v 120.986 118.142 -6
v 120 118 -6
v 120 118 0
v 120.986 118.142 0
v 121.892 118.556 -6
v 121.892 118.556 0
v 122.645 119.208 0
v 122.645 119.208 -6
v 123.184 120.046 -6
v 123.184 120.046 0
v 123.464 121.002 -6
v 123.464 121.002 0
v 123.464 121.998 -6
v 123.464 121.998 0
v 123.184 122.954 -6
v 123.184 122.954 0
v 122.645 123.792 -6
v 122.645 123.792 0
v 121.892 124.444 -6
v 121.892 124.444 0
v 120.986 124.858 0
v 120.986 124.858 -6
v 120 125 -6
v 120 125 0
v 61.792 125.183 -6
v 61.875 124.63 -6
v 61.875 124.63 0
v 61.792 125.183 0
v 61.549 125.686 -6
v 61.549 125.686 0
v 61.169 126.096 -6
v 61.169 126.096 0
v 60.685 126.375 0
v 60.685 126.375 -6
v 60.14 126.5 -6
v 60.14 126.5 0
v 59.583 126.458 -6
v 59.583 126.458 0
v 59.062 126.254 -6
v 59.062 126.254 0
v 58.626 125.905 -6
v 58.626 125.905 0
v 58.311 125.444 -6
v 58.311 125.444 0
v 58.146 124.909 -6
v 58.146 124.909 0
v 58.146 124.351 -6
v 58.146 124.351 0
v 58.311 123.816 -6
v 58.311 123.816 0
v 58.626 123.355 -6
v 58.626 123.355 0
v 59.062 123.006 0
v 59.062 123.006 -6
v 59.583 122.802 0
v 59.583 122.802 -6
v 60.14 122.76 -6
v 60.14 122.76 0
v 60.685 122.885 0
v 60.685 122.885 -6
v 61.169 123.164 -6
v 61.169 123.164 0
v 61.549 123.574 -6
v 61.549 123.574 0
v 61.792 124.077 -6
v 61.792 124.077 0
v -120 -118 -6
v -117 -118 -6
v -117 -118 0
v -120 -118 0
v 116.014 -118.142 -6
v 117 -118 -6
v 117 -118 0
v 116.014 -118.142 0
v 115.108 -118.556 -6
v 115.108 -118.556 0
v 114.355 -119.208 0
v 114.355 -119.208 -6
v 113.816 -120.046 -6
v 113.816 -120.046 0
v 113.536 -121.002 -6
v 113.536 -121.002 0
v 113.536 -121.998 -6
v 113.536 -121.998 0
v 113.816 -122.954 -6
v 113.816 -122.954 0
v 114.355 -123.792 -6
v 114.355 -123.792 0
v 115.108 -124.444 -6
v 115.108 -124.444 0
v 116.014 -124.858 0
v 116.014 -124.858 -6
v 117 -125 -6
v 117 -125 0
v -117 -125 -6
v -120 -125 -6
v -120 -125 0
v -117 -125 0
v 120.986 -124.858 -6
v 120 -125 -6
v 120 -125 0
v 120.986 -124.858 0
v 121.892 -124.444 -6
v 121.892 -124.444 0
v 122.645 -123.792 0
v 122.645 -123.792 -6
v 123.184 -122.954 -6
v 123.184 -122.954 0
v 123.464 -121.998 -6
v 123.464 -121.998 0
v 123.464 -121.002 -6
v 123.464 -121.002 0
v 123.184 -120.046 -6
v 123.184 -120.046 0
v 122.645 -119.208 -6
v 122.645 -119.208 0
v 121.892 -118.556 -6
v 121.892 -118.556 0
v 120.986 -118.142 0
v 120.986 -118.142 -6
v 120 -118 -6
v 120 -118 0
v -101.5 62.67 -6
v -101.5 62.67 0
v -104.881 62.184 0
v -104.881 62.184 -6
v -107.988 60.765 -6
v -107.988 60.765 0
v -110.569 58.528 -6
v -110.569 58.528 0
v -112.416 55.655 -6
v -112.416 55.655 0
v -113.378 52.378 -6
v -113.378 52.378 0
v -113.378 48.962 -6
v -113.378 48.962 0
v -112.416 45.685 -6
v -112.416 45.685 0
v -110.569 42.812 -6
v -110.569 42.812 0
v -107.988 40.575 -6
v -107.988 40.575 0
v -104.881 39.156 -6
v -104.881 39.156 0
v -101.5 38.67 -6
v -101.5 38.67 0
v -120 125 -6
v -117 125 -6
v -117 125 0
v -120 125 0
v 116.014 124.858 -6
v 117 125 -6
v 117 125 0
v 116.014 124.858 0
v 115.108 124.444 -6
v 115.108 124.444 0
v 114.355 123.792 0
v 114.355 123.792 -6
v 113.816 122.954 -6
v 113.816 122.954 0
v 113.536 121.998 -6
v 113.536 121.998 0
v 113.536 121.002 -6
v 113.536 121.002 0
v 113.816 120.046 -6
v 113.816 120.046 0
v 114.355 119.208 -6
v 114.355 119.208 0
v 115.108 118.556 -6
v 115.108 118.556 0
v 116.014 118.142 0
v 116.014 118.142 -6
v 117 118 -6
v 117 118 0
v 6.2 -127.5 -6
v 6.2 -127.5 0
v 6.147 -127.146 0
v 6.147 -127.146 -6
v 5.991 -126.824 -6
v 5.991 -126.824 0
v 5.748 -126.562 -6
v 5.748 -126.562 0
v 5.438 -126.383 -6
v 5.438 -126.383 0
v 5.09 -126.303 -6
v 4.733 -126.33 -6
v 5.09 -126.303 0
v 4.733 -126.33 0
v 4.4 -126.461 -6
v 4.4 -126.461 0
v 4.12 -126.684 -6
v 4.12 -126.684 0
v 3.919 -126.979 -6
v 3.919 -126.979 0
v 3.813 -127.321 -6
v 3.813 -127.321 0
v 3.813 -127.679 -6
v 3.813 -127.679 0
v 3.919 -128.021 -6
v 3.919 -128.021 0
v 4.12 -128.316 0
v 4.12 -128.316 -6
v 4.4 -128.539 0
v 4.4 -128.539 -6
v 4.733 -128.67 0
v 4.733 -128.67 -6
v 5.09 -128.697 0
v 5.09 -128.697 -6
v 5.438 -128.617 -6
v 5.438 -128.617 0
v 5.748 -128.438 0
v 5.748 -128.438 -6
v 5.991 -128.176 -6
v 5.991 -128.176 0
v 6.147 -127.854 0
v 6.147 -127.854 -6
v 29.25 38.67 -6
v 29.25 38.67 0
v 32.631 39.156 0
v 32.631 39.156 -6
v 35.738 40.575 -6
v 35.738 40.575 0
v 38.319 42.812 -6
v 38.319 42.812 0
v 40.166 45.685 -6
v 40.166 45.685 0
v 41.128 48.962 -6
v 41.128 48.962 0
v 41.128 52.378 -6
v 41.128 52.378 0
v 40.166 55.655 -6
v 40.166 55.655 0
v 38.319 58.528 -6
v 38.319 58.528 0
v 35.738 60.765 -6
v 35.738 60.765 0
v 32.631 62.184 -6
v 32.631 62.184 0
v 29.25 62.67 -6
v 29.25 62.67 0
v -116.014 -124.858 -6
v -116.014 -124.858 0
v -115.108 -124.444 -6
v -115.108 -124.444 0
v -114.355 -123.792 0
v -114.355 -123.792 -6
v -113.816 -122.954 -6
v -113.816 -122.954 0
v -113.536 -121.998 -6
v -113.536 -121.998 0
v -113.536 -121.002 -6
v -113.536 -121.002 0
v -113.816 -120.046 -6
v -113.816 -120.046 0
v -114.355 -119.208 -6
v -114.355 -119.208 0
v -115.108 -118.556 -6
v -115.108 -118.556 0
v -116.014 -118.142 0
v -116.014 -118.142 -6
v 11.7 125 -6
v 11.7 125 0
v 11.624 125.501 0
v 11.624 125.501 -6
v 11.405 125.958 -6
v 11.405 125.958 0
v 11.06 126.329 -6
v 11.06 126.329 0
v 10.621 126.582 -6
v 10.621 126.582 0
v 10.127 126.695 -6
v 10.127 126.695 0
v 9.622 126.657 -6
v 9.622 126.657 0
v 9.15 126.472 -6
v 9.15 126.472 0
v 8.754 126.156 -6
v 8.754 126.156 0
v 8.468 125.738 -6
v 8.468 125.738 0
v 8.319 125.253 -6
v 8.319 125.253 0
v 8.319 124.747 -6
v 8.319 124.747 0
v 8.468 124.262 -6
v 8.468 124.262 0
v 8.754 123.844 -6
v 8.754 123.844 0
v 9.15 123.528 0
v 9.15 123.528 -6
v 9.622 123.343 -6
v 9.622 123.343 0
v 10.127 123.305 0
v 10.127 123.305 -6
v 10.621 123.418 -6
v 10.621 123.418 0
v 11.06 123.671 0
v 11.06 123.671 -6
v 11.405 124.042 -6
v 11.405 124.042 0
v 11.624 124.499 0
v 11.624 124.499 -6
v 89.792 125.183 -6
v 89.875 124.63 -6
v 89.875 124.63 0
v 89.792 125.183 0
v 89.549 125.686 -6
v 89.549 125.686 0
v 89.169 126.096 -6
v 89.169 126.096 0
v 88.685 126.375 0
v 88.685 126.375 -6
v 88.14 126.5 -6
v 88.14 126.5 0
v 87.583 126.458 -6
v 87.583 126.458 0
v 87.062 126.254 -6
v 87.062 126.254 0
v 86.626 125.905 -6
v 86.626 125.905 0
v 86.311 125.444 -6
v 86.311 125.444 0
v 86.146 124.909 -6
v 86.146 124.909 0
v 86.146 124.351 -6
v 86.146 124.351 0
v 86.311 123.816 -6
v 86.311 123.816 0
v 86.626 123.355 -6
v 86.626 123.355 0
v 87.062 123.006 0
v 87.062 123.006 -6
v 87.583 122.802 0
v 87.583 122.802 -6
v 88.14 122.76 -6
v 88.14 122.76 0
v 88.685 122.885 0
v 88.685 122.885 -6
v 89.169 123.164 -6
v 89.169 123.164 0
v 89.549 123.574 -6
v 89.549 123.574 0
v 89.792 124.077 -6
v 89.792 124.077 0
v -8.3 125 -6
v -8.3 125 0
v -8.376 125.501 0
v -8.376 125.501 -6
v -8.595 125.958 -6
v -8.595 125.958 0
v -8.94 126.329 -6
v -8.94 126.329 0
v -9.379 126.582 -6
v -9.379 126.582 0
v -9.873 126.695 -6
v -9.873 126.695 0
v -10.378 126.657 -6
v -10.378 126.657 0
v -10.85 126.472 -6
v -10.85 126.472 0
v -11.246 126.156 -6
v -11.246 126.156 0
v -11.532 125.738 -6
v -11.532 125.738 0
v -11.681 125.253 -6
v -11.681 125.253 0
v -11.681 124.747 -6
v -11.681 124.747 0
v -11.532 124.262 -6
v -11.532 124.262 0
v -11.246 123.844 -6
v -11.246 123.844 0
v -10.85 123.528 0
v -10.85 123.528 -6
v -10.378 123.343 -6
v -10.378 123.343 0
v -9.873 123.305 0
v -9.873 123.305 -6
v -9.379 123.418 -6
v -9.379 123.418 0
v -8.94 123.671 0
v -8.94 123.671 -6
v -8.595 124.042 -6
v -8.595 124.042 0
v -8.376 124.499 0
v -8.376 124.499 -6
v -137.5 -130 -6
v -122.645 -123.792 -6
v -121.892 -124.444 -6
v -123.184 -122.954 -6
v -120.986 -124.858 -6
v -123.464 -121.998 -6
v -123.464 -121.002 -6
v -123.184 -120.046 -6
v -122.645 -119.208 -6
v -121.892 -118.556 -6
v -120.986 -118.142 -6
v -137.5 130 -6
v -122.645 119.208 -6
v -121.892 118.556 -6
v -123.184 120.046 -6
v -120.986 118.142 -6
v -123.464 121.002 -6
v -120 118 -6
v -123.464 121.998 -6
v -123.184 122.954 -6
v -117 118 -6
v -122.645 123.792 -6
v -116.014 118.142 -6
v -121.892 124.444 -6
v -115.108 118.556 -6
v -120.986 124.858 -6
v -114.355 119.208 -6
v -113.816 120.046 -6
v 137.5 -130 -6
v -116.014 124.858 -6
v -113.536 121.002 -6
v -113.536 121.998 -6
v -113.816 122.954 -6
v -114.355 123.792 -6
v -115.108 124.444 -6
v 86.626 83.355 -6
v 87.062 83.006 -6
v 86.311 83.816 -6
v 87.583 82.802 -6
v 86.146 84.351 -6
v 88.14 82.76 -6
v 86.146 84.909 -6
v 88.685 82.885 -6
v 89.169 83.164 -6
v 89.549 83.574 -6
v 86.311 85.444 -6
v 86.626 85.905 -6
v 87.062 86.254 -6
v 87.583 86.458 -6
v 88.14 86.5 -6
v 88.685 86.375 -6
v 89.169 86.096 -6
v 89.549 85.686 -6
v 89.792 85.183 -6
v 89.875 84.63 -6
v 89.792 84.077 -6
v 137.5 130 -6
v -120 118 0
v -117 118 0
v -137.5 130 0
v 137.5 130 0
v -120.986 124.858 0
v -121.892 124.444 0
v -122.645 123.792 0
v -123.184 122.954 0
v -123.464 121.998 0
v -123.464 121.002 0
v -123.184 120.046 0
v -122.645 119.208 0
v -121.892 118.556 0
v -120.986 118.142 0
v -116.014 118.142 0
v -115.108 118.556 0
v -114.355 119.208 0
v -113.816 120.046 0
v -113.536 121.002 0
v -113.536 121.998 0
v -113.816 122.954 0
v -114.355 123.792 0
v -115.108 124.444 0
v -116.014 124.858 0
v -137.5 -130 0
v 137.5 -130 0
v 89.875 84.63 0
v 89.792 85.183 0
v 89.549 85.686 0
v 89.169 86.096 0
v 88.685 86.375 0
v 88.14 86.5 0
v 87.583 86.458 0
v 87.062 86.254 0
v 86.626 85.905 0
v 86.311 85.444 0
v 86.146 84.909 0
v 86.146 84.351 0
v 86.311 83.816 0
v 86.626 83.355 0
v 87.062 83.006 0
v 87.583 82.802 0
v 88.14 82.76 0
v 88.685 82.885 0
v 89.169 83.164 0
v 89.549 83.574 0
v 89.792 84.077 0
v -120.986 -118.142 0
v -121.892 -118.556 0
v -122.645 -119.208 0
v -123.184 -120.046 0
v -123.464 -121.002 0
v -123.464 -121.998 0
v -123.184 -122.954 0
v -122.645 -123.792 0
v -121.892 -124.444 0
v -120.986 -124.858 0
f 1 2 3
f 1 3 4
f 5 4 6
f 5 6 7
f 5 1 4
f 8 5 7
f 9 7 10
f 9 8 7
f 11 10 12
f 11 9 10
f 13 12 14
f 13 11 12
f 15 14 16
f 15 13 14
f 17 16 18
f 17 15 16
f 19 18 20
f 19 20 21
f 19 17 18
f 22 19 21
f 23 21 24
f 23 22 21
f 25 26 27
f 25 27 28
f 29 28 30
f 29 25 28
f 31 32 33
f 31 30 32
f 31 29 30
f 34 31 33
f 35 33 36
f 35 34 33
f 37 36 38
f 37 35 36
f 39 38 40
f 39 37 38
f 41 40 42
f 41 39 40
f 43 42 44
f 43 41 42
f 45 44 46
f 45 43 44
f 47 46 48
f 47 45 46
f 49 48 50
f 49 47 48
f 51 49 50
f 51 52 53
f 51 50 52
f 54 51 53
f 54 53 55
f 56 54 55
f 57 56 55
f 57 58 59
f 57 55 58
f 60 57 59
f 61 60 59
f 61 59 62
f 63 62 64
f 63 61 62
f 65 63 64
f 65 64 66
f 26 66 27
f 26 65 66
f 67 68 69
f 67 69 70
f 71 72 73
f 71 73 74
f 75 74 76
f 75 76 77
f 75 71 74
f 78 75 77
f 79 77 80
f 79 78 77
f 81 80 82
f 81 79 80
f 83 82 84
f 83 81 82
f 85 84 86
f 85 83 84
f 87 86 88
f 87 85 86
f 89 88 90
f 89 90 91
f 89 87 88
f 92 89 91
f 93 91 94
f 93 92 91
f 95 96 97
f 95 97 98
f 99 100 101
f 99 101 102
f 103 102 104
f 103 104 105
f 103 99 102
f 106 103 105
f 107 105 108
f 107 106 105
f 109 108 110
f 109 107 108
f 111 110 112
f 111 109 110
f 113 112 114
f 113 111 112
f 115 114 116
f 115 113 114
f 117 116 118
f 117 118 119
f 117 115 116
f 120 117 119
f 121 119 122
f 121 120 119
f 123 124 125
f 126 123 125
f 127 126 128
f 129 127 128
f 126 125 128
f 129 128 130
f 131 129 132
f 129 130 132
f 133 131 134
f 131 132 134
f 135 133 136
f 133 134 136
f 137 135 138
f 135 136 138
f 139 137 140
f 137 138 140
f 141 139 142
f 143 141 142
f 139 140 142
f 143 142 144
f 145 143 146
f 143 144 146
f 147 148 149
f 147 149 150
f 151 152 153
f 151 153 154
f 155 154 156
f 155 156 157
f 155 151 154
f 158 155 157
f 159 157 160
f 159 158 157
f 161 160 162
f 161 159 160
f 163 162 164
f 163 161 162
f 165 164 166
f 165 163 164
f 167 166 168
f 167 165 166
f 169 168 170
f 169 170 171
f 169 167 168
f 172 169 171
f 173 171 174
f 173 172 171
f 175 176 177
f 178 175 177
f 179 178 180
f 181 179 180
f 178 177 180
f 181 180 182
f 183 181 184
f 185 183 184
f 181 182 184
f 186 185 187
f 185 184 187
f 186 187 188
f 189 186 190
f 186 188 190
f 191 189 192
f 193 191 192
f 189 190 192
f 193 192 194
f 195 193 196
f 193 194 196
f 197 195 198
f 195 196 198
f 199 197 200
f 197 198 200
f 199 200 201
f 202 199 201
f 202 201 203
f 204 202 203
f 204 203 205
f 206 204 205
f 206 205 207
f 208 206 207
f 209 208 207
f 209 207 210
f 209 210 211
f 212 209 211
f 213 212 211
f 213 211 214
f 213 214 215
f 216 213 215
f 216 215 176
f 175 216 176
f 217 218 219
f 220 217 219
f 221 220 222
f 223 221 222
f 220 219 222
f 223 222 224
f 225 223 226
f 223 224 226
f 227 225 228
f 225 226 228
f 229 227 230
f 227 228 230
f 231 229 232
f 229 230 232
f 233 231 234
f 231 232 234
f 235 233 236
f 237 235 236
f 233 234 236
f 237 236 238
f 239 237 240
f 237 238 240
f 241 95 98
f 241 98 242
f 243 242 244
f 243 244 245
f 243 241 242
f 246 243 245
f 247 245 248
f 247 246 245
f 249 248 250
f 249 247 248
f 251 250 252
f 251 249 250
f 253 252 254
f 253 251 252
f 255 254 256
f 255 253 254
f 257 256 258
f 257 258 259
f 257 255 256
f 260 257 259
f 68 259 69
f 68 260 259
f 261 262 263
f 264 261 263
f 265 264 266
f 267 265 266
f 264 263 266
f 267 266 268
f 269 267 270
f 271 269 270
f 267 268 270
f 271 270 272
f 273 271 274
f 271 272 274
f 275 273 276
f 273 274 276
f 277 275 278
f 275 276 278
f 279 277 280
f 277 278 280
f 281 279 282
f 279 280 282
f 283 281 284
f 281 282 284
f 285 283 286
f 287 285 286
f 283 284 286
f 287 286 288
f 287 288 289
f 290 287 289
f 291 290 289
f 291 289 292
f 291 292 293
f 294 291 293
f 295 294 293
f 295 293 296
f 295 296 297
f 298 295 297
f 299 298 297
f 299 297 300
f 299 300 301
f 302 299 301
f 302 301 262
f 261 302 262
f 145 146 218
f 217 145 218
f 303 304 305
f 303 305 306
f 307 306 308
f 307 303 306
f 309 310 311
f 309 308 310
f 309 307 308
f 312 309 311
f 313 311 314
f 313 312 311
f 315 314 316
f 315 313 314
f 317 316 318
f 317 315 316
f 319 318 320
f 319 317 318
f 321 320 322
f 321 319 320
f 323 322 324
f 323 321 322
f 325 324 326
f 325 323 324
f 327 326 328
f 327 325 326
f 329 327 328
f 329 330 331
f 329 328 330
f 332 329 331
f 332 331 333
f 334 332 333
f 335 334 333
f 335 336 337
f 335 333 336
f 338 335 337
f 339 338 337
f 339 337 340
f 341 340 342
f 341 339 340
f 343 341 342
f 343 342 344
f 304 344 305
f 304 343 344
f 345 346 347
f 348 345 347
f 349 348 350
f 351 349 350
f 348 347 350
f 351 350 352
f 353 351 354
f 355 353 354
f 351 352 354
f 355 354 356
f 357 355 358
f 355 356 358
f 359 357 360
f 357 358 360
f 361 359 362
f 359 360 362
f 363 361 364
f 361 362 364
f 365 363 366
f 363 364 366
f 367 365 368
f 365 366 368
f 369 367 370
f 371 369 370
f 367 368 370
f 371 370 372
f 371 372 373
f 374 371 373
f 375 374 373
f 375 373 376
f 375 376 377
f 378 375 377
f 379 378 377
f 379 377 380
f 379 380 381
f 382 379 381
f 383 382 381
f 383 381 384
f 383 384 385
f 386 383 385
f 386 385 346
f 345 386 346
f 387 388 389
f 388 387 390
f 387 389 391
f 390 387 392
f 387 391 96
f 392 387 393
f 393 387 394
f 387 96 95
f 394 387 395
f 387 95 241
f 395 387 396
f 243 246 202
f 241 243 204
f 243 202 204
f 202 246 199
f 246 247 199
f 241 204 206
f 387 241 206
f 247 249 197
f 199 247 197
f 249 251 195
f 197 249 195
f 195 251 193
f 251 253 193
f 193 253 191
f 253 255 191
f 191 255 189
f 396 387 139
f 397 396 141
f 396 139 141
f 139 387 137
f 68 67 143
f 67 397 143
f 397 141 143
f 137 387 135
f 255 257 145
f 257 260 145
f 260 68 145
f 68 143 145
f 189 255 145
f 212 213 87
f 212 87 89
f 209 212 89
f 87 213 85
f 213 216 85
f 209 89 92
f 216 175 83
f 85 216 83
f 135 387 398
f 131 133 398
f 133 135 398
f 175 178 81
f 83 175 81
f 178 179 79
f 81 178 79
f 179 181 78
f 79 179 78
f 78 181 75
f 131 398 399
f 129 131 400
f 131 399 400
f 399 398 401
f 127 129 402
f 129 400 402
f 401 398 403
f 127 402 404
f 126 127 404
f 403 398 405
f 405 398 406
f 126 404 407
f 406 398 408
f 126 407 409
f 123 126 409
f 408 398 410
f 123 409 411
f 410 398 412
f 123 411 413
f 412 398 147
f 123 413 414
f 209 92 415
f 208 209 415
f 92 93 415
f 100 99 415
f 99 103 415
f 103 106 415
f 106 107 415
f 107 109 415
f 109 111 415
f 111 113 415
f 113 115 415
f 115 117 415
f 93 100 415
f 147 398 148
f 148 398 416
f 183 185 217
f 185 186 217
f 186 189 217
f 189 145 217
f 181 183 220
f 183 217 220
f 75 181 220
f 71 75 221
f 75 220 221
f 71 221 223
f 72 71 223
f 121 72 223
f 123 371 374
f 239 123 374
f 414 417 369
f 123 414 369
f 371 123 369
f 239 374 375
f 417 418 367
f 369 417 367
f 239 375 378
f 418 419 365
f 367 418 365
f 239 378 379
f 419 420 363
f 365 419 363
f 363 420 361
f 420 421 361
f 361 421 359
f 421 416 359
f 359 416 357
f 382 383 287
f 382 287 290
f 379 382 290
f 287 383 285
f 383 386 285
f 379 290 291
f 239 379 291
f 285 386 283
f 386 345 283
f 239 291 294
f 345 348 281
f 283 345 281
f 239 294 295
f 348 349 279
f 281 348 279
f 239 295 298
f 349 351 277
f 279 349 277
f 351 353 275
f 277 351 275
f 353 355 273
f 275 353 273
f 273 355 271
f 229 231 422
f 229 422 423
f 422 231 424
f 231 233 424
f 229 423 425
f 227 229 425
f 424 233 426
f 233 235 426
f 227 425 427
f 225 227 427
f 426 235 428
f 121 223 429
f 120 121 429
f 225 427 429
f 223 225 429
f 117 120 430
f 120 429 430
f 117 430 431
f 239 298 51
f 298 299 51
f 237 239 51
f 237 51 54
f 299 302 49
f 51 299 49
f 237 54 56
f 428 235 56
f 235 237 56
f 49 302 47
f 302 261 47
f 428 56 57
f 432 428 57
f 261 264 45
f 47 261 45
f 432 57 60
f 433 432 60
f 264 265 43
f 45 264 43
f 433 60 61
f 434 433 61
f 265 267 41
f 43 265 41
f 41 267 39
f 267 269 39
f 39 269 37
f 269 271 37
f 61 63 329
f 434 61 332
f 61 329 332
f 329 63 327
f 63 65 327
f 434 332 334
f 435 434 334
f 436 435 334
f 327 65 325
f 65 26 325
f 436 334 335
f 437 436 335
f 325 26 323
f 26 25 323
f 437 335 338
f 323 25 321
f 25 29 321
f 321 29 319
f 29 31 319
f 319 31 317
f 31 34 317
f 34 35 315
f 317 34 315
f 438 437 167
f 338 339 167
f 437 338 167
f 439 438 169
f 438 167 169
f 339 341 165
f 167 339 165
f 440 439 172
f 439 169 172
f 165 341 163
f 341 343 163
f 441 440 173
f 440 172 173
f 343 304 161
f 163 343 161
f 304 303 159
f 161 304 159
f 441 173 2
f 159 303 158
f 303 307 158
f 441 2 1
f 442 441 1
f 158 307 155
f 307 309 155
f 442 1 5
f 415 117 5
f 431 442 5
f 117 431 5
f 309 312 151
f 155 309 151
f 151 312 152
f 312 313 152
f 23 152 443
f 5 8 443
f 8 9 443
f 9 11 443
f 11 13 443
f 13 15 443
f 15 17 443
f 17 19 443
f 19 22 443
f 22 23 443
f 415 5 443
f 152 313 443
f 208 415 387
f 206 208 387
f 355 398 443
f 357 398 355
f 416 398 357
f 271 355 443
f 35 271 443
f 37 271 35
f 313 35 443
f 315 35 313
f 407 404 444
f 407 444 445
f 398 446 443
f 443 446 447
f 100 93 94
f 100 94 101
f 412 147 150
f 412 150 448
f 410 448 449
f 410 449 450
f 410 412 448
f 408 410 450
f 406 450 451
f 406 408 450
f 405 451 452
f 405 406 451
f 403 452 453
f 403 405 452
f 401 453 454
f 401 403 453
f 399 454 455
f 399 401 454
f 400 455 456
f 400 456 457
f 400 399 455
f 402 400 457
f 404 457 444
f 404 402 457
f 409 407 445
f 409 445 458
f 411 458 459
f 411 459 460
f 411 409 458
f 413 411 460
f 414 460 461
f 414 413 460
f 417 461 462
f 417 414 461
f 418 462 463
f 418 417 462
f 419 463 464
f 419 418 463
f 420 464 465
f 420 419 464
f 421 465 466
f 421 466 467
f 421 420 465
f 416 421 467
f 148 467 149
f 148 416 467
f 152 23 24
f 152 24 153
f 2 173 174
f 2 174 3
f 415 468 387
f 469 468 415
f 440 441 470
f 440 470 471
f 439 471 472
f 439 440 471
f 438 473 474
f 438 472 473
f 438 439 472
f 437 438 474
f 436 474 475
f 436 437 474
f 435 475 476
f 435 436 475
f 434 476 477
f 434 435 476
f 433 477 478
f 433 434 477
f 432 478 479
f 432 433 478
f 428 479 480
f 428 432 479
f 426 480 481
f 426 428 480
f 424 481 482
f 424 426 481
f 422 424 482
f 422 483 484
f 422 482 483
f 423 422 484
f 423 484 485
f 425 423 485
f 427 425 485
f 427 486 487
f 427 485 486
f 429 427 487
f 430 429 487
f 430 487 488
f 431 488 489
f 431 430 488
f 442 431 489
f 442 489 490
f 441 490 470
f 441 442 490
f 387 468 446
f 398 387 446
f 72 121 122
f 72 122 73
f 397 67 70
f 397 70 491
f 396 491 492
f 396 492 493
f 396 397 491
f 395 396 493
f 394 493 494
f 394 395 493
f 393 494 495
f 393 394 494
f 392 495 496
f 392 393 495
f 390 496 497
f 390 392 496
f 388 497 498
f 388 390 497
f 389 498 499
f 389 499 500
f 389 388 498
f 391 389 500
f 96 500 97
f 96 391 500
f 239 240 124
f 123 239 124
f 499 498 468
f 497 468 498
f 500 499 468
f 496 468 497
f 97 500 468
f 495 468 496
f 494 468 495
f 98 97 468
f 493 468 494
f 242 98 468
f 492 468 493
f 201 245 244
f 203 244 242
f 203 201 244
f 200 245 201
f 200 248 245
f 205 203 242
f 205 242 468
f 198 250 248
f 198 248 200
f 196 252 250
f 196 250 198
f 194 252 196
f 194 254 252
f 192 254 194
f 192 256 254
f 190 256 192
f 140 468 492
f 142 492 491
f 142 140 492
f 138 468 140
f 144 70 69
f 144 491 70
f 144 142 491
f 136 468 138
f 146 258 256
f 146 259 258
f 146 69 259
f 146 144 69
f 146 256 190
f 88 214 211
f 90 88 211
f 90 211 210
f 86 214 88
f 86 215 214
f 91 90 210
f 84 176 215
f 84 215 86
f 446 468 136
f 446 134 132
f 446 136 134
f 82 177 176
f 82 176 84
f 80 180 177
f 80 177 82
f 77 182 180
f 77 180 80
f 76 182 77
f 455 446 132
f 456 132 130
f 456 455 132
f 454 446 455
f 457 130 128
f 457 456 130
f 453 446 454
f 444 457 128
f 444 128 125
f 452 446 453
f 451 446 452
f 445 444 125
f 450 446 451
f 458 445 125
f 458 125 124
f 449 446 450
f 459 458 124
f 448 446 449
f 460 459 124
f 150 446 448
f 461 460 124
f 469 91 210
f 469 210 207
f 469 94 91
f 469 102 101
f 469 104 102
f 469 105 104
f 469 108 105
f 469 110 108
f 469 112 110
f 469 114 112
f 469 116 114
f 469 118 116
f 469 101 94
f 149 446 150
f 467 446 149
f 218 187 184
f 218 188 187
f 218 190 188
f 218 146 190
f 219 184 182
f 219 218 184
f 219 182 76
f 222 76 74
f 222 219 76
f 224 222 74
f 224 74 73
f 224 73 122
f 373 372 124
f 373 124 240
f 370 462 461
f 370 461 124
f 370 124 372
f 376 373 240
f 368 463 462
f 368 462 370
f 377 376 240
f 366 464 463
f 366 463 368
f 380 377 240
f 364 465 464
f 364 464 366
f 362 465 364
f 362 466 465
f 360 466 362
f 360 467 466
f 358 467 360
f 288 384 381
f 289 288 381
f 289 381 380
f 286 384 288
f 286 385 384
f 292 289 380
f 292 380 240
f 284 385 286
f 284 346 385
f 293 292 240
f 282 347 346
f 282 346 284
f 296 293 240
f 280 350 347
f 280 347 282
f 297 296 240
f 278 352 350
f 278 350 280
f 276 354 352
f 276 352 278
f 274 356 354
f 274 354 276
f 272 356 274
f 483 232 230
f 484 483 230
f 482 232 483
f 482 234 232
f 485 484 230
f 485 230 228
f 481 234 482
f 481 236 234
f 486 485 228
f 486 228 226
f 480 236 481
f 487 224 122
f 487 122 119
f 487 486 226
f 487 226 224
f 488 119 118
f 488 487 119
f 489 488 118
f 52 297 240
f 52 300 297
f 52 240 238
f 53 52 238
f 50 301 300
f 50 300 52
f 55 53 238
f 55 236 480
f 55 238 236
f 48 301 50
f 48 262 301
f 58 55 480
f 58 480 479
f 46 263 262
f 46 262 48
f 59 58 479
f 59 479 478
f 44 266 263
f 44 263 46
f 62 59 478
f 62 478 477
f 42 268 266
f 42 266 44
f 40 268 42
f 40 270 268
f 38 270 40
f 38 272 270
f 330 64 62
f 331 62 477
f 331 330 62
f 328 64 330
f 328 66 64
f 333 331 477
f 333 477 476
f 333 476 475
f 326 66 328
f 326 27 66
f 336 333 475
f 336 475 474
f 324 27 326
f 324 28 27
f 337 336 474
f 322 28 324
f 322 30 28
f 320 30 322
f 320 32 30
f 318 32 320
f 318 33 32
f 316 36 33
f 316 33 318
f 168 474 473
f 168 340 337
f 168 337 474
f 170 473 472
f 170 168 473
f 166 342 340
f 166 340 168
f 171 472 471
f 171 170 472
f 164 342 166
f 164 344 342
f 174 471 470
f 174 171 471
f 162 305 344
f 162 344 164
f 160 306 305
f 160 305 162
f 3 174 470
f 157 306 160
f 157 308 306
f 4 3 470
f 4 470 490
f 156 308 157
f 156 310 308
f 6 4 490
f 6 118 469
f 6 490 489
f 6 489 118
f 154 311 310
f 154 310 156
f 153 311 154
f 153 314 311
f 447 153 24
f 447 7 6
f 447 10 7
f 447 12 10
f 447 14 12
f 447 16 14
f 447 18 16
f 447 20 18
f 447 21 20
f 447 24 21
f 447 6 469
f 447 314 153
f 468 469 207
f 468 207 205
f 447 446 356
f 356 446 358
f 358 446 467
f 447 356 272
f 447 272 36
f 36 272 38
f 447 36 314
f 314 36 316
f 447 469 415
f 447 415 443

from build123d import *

# Parameters (mm, degrees)
CROQUIS1_W                      = 275
CROQUIS1_H                      = 260
BRIDA_BASE1_DEPTH               = 6
CORTAR_EXTRUIR1_DEPTH           = 190.320495457
CORTAR_EXTRUIR2_DEPTH           = 190.320495457
CORTAR_EXTRUIR2_DEPTH_BACK      = 190.320495457
CROQUIS3_R                      = 1.875
RANURA_START                    = -6
RANURA_DE_MARGEN_PARA_M61_DEPTH = 6
CROQUIS8_R                      = 1.2
CORTAR_EXTRUIR4_DEPTH           = 190.320495457
TALADRO_DE_MARGEN_PARA_M31_D    = 3.4


# Read off the part's stored shape, not the designer's step: Ranura de margen para M61
# Sheet-metal steps are written as plain solids
with BuildPart() as part:
    # Croquis1 → Brida base1 (new body)
    with BuildSketch(Plane.XY):
        Rectangle(CROQUIS1_W, CROQUIS1_H)
    extrude(amount=-BRIDA_BASE1_DEPTH)

    # Croquis2 → Cortar-Extruir1 (cut, through all)
    with BuildSketch(Plane.XY):
        with BuildLine():
            Line((-101.5, 38.67), (29.25, 38.67))
            ThreePointArc((29.25, 38.67), (41.25, 50.67), (29.25, 62.67))
            Line((29.25, 62.67), (-101.5, 62.67))
            ThreePointArc((-101.5, 62.67), (-113.5, 50.67), (-101.5, 38.67))
        make_face()
    extrude(amount=-CORTAR_EXTRUIR1_DEPTH, mode=Mode.SUBTRACT)

    # Croquis3 → Cortar-Extruir2 (cut, two sides: drawn at the far end of the back side and taken through both)
    with BuildSketch(Plane.XY.offset(-CORTAR_EXTRUIR2_DEPTH_BACK)):
        with Locations((88, 84.63)):
            Circle(CROQUIS3_R)
        with Locations((88, 124.63)):
            Circle(CROQUIS3_R)
        with Locations((60, 124.63)):
            Circle(CROQUIS3_R)
    extrude(amount=CORTAR_EXTRUIR2_DEPTH + CORTAR_EXTRUIR2_DEPTH_BACK, mode=Mode.SUBTRACT)

    # Ranura de margen para M61 outline → Ranura de margen para M61 (cut)
    with BuildSketch(Plane.XY.offset(RANURA_START)):
        with BuildLine():
            Line((120, 125), (117, 125))
            ThreePointArc((117, 125), (113.5, 121.5), (117, 118))
            Line((117, 118), (120, 118))
            ThreePointArc((120, 118), (123.5, 121.5), (120, 125))
        make_face()
        with BuildLine():
            ThreePointArc((-120, 125), (-123.5, 121.5), (-120, 118))
            Line((-120, 118), (-117, 118))
            ThreePointArc((-117, 118), (-113.5, 121.5), (-117, 125))
            Line((-117, 125), (-120, 125))
        make_face()
        with BuildLine():
            Line((-117, -118), (-120, -118))
            ThreePointArc((-120, -118), (-123.5, -121.5), (-120, -125))
            Line((-120, -125), (-117, -125))
            ThreePointArc((-117, -125), (-113.5, -121.5), (-117, -118))
        make_face()
        with BuildLine():
            ThreePointArc((117, -118), (113.5, -121.5), (117, -125))
            Line((117, -125), (120, -125))
            ThreePointArc((120, -125), (123.5, -121.5), (120, -118))
            Line((120, -118), (117, -118))
        make_face()
    extrude(amount=RANURA_DE_MARGEN_PARA_M61_DEPTH, mode=Mode.SUBTRACT)

    # Croquis8 → Cortar-Extruir4 (cut, through all)
    with BuildSketch(Plane.XY):
        with Locations((5, -127.5)):
            Circle(CROQUIS8_R)
    extrude(amount=-CORTAR_EXTRUIR4_DEPTH, mode=Mode.SUBTRACT)

    # Taladro de margen para M31 (through all)
    with Locations(Plane(origin=(0, 0, -6), x_dir=(-1, 0, 0), z_dir=(0, 0, -1))):
        with Locations((10, 125), (-10, 125)):
            Hole(TALADRO_DE_MARGEN_PARA_M31_D / 2)


solid = part.part
